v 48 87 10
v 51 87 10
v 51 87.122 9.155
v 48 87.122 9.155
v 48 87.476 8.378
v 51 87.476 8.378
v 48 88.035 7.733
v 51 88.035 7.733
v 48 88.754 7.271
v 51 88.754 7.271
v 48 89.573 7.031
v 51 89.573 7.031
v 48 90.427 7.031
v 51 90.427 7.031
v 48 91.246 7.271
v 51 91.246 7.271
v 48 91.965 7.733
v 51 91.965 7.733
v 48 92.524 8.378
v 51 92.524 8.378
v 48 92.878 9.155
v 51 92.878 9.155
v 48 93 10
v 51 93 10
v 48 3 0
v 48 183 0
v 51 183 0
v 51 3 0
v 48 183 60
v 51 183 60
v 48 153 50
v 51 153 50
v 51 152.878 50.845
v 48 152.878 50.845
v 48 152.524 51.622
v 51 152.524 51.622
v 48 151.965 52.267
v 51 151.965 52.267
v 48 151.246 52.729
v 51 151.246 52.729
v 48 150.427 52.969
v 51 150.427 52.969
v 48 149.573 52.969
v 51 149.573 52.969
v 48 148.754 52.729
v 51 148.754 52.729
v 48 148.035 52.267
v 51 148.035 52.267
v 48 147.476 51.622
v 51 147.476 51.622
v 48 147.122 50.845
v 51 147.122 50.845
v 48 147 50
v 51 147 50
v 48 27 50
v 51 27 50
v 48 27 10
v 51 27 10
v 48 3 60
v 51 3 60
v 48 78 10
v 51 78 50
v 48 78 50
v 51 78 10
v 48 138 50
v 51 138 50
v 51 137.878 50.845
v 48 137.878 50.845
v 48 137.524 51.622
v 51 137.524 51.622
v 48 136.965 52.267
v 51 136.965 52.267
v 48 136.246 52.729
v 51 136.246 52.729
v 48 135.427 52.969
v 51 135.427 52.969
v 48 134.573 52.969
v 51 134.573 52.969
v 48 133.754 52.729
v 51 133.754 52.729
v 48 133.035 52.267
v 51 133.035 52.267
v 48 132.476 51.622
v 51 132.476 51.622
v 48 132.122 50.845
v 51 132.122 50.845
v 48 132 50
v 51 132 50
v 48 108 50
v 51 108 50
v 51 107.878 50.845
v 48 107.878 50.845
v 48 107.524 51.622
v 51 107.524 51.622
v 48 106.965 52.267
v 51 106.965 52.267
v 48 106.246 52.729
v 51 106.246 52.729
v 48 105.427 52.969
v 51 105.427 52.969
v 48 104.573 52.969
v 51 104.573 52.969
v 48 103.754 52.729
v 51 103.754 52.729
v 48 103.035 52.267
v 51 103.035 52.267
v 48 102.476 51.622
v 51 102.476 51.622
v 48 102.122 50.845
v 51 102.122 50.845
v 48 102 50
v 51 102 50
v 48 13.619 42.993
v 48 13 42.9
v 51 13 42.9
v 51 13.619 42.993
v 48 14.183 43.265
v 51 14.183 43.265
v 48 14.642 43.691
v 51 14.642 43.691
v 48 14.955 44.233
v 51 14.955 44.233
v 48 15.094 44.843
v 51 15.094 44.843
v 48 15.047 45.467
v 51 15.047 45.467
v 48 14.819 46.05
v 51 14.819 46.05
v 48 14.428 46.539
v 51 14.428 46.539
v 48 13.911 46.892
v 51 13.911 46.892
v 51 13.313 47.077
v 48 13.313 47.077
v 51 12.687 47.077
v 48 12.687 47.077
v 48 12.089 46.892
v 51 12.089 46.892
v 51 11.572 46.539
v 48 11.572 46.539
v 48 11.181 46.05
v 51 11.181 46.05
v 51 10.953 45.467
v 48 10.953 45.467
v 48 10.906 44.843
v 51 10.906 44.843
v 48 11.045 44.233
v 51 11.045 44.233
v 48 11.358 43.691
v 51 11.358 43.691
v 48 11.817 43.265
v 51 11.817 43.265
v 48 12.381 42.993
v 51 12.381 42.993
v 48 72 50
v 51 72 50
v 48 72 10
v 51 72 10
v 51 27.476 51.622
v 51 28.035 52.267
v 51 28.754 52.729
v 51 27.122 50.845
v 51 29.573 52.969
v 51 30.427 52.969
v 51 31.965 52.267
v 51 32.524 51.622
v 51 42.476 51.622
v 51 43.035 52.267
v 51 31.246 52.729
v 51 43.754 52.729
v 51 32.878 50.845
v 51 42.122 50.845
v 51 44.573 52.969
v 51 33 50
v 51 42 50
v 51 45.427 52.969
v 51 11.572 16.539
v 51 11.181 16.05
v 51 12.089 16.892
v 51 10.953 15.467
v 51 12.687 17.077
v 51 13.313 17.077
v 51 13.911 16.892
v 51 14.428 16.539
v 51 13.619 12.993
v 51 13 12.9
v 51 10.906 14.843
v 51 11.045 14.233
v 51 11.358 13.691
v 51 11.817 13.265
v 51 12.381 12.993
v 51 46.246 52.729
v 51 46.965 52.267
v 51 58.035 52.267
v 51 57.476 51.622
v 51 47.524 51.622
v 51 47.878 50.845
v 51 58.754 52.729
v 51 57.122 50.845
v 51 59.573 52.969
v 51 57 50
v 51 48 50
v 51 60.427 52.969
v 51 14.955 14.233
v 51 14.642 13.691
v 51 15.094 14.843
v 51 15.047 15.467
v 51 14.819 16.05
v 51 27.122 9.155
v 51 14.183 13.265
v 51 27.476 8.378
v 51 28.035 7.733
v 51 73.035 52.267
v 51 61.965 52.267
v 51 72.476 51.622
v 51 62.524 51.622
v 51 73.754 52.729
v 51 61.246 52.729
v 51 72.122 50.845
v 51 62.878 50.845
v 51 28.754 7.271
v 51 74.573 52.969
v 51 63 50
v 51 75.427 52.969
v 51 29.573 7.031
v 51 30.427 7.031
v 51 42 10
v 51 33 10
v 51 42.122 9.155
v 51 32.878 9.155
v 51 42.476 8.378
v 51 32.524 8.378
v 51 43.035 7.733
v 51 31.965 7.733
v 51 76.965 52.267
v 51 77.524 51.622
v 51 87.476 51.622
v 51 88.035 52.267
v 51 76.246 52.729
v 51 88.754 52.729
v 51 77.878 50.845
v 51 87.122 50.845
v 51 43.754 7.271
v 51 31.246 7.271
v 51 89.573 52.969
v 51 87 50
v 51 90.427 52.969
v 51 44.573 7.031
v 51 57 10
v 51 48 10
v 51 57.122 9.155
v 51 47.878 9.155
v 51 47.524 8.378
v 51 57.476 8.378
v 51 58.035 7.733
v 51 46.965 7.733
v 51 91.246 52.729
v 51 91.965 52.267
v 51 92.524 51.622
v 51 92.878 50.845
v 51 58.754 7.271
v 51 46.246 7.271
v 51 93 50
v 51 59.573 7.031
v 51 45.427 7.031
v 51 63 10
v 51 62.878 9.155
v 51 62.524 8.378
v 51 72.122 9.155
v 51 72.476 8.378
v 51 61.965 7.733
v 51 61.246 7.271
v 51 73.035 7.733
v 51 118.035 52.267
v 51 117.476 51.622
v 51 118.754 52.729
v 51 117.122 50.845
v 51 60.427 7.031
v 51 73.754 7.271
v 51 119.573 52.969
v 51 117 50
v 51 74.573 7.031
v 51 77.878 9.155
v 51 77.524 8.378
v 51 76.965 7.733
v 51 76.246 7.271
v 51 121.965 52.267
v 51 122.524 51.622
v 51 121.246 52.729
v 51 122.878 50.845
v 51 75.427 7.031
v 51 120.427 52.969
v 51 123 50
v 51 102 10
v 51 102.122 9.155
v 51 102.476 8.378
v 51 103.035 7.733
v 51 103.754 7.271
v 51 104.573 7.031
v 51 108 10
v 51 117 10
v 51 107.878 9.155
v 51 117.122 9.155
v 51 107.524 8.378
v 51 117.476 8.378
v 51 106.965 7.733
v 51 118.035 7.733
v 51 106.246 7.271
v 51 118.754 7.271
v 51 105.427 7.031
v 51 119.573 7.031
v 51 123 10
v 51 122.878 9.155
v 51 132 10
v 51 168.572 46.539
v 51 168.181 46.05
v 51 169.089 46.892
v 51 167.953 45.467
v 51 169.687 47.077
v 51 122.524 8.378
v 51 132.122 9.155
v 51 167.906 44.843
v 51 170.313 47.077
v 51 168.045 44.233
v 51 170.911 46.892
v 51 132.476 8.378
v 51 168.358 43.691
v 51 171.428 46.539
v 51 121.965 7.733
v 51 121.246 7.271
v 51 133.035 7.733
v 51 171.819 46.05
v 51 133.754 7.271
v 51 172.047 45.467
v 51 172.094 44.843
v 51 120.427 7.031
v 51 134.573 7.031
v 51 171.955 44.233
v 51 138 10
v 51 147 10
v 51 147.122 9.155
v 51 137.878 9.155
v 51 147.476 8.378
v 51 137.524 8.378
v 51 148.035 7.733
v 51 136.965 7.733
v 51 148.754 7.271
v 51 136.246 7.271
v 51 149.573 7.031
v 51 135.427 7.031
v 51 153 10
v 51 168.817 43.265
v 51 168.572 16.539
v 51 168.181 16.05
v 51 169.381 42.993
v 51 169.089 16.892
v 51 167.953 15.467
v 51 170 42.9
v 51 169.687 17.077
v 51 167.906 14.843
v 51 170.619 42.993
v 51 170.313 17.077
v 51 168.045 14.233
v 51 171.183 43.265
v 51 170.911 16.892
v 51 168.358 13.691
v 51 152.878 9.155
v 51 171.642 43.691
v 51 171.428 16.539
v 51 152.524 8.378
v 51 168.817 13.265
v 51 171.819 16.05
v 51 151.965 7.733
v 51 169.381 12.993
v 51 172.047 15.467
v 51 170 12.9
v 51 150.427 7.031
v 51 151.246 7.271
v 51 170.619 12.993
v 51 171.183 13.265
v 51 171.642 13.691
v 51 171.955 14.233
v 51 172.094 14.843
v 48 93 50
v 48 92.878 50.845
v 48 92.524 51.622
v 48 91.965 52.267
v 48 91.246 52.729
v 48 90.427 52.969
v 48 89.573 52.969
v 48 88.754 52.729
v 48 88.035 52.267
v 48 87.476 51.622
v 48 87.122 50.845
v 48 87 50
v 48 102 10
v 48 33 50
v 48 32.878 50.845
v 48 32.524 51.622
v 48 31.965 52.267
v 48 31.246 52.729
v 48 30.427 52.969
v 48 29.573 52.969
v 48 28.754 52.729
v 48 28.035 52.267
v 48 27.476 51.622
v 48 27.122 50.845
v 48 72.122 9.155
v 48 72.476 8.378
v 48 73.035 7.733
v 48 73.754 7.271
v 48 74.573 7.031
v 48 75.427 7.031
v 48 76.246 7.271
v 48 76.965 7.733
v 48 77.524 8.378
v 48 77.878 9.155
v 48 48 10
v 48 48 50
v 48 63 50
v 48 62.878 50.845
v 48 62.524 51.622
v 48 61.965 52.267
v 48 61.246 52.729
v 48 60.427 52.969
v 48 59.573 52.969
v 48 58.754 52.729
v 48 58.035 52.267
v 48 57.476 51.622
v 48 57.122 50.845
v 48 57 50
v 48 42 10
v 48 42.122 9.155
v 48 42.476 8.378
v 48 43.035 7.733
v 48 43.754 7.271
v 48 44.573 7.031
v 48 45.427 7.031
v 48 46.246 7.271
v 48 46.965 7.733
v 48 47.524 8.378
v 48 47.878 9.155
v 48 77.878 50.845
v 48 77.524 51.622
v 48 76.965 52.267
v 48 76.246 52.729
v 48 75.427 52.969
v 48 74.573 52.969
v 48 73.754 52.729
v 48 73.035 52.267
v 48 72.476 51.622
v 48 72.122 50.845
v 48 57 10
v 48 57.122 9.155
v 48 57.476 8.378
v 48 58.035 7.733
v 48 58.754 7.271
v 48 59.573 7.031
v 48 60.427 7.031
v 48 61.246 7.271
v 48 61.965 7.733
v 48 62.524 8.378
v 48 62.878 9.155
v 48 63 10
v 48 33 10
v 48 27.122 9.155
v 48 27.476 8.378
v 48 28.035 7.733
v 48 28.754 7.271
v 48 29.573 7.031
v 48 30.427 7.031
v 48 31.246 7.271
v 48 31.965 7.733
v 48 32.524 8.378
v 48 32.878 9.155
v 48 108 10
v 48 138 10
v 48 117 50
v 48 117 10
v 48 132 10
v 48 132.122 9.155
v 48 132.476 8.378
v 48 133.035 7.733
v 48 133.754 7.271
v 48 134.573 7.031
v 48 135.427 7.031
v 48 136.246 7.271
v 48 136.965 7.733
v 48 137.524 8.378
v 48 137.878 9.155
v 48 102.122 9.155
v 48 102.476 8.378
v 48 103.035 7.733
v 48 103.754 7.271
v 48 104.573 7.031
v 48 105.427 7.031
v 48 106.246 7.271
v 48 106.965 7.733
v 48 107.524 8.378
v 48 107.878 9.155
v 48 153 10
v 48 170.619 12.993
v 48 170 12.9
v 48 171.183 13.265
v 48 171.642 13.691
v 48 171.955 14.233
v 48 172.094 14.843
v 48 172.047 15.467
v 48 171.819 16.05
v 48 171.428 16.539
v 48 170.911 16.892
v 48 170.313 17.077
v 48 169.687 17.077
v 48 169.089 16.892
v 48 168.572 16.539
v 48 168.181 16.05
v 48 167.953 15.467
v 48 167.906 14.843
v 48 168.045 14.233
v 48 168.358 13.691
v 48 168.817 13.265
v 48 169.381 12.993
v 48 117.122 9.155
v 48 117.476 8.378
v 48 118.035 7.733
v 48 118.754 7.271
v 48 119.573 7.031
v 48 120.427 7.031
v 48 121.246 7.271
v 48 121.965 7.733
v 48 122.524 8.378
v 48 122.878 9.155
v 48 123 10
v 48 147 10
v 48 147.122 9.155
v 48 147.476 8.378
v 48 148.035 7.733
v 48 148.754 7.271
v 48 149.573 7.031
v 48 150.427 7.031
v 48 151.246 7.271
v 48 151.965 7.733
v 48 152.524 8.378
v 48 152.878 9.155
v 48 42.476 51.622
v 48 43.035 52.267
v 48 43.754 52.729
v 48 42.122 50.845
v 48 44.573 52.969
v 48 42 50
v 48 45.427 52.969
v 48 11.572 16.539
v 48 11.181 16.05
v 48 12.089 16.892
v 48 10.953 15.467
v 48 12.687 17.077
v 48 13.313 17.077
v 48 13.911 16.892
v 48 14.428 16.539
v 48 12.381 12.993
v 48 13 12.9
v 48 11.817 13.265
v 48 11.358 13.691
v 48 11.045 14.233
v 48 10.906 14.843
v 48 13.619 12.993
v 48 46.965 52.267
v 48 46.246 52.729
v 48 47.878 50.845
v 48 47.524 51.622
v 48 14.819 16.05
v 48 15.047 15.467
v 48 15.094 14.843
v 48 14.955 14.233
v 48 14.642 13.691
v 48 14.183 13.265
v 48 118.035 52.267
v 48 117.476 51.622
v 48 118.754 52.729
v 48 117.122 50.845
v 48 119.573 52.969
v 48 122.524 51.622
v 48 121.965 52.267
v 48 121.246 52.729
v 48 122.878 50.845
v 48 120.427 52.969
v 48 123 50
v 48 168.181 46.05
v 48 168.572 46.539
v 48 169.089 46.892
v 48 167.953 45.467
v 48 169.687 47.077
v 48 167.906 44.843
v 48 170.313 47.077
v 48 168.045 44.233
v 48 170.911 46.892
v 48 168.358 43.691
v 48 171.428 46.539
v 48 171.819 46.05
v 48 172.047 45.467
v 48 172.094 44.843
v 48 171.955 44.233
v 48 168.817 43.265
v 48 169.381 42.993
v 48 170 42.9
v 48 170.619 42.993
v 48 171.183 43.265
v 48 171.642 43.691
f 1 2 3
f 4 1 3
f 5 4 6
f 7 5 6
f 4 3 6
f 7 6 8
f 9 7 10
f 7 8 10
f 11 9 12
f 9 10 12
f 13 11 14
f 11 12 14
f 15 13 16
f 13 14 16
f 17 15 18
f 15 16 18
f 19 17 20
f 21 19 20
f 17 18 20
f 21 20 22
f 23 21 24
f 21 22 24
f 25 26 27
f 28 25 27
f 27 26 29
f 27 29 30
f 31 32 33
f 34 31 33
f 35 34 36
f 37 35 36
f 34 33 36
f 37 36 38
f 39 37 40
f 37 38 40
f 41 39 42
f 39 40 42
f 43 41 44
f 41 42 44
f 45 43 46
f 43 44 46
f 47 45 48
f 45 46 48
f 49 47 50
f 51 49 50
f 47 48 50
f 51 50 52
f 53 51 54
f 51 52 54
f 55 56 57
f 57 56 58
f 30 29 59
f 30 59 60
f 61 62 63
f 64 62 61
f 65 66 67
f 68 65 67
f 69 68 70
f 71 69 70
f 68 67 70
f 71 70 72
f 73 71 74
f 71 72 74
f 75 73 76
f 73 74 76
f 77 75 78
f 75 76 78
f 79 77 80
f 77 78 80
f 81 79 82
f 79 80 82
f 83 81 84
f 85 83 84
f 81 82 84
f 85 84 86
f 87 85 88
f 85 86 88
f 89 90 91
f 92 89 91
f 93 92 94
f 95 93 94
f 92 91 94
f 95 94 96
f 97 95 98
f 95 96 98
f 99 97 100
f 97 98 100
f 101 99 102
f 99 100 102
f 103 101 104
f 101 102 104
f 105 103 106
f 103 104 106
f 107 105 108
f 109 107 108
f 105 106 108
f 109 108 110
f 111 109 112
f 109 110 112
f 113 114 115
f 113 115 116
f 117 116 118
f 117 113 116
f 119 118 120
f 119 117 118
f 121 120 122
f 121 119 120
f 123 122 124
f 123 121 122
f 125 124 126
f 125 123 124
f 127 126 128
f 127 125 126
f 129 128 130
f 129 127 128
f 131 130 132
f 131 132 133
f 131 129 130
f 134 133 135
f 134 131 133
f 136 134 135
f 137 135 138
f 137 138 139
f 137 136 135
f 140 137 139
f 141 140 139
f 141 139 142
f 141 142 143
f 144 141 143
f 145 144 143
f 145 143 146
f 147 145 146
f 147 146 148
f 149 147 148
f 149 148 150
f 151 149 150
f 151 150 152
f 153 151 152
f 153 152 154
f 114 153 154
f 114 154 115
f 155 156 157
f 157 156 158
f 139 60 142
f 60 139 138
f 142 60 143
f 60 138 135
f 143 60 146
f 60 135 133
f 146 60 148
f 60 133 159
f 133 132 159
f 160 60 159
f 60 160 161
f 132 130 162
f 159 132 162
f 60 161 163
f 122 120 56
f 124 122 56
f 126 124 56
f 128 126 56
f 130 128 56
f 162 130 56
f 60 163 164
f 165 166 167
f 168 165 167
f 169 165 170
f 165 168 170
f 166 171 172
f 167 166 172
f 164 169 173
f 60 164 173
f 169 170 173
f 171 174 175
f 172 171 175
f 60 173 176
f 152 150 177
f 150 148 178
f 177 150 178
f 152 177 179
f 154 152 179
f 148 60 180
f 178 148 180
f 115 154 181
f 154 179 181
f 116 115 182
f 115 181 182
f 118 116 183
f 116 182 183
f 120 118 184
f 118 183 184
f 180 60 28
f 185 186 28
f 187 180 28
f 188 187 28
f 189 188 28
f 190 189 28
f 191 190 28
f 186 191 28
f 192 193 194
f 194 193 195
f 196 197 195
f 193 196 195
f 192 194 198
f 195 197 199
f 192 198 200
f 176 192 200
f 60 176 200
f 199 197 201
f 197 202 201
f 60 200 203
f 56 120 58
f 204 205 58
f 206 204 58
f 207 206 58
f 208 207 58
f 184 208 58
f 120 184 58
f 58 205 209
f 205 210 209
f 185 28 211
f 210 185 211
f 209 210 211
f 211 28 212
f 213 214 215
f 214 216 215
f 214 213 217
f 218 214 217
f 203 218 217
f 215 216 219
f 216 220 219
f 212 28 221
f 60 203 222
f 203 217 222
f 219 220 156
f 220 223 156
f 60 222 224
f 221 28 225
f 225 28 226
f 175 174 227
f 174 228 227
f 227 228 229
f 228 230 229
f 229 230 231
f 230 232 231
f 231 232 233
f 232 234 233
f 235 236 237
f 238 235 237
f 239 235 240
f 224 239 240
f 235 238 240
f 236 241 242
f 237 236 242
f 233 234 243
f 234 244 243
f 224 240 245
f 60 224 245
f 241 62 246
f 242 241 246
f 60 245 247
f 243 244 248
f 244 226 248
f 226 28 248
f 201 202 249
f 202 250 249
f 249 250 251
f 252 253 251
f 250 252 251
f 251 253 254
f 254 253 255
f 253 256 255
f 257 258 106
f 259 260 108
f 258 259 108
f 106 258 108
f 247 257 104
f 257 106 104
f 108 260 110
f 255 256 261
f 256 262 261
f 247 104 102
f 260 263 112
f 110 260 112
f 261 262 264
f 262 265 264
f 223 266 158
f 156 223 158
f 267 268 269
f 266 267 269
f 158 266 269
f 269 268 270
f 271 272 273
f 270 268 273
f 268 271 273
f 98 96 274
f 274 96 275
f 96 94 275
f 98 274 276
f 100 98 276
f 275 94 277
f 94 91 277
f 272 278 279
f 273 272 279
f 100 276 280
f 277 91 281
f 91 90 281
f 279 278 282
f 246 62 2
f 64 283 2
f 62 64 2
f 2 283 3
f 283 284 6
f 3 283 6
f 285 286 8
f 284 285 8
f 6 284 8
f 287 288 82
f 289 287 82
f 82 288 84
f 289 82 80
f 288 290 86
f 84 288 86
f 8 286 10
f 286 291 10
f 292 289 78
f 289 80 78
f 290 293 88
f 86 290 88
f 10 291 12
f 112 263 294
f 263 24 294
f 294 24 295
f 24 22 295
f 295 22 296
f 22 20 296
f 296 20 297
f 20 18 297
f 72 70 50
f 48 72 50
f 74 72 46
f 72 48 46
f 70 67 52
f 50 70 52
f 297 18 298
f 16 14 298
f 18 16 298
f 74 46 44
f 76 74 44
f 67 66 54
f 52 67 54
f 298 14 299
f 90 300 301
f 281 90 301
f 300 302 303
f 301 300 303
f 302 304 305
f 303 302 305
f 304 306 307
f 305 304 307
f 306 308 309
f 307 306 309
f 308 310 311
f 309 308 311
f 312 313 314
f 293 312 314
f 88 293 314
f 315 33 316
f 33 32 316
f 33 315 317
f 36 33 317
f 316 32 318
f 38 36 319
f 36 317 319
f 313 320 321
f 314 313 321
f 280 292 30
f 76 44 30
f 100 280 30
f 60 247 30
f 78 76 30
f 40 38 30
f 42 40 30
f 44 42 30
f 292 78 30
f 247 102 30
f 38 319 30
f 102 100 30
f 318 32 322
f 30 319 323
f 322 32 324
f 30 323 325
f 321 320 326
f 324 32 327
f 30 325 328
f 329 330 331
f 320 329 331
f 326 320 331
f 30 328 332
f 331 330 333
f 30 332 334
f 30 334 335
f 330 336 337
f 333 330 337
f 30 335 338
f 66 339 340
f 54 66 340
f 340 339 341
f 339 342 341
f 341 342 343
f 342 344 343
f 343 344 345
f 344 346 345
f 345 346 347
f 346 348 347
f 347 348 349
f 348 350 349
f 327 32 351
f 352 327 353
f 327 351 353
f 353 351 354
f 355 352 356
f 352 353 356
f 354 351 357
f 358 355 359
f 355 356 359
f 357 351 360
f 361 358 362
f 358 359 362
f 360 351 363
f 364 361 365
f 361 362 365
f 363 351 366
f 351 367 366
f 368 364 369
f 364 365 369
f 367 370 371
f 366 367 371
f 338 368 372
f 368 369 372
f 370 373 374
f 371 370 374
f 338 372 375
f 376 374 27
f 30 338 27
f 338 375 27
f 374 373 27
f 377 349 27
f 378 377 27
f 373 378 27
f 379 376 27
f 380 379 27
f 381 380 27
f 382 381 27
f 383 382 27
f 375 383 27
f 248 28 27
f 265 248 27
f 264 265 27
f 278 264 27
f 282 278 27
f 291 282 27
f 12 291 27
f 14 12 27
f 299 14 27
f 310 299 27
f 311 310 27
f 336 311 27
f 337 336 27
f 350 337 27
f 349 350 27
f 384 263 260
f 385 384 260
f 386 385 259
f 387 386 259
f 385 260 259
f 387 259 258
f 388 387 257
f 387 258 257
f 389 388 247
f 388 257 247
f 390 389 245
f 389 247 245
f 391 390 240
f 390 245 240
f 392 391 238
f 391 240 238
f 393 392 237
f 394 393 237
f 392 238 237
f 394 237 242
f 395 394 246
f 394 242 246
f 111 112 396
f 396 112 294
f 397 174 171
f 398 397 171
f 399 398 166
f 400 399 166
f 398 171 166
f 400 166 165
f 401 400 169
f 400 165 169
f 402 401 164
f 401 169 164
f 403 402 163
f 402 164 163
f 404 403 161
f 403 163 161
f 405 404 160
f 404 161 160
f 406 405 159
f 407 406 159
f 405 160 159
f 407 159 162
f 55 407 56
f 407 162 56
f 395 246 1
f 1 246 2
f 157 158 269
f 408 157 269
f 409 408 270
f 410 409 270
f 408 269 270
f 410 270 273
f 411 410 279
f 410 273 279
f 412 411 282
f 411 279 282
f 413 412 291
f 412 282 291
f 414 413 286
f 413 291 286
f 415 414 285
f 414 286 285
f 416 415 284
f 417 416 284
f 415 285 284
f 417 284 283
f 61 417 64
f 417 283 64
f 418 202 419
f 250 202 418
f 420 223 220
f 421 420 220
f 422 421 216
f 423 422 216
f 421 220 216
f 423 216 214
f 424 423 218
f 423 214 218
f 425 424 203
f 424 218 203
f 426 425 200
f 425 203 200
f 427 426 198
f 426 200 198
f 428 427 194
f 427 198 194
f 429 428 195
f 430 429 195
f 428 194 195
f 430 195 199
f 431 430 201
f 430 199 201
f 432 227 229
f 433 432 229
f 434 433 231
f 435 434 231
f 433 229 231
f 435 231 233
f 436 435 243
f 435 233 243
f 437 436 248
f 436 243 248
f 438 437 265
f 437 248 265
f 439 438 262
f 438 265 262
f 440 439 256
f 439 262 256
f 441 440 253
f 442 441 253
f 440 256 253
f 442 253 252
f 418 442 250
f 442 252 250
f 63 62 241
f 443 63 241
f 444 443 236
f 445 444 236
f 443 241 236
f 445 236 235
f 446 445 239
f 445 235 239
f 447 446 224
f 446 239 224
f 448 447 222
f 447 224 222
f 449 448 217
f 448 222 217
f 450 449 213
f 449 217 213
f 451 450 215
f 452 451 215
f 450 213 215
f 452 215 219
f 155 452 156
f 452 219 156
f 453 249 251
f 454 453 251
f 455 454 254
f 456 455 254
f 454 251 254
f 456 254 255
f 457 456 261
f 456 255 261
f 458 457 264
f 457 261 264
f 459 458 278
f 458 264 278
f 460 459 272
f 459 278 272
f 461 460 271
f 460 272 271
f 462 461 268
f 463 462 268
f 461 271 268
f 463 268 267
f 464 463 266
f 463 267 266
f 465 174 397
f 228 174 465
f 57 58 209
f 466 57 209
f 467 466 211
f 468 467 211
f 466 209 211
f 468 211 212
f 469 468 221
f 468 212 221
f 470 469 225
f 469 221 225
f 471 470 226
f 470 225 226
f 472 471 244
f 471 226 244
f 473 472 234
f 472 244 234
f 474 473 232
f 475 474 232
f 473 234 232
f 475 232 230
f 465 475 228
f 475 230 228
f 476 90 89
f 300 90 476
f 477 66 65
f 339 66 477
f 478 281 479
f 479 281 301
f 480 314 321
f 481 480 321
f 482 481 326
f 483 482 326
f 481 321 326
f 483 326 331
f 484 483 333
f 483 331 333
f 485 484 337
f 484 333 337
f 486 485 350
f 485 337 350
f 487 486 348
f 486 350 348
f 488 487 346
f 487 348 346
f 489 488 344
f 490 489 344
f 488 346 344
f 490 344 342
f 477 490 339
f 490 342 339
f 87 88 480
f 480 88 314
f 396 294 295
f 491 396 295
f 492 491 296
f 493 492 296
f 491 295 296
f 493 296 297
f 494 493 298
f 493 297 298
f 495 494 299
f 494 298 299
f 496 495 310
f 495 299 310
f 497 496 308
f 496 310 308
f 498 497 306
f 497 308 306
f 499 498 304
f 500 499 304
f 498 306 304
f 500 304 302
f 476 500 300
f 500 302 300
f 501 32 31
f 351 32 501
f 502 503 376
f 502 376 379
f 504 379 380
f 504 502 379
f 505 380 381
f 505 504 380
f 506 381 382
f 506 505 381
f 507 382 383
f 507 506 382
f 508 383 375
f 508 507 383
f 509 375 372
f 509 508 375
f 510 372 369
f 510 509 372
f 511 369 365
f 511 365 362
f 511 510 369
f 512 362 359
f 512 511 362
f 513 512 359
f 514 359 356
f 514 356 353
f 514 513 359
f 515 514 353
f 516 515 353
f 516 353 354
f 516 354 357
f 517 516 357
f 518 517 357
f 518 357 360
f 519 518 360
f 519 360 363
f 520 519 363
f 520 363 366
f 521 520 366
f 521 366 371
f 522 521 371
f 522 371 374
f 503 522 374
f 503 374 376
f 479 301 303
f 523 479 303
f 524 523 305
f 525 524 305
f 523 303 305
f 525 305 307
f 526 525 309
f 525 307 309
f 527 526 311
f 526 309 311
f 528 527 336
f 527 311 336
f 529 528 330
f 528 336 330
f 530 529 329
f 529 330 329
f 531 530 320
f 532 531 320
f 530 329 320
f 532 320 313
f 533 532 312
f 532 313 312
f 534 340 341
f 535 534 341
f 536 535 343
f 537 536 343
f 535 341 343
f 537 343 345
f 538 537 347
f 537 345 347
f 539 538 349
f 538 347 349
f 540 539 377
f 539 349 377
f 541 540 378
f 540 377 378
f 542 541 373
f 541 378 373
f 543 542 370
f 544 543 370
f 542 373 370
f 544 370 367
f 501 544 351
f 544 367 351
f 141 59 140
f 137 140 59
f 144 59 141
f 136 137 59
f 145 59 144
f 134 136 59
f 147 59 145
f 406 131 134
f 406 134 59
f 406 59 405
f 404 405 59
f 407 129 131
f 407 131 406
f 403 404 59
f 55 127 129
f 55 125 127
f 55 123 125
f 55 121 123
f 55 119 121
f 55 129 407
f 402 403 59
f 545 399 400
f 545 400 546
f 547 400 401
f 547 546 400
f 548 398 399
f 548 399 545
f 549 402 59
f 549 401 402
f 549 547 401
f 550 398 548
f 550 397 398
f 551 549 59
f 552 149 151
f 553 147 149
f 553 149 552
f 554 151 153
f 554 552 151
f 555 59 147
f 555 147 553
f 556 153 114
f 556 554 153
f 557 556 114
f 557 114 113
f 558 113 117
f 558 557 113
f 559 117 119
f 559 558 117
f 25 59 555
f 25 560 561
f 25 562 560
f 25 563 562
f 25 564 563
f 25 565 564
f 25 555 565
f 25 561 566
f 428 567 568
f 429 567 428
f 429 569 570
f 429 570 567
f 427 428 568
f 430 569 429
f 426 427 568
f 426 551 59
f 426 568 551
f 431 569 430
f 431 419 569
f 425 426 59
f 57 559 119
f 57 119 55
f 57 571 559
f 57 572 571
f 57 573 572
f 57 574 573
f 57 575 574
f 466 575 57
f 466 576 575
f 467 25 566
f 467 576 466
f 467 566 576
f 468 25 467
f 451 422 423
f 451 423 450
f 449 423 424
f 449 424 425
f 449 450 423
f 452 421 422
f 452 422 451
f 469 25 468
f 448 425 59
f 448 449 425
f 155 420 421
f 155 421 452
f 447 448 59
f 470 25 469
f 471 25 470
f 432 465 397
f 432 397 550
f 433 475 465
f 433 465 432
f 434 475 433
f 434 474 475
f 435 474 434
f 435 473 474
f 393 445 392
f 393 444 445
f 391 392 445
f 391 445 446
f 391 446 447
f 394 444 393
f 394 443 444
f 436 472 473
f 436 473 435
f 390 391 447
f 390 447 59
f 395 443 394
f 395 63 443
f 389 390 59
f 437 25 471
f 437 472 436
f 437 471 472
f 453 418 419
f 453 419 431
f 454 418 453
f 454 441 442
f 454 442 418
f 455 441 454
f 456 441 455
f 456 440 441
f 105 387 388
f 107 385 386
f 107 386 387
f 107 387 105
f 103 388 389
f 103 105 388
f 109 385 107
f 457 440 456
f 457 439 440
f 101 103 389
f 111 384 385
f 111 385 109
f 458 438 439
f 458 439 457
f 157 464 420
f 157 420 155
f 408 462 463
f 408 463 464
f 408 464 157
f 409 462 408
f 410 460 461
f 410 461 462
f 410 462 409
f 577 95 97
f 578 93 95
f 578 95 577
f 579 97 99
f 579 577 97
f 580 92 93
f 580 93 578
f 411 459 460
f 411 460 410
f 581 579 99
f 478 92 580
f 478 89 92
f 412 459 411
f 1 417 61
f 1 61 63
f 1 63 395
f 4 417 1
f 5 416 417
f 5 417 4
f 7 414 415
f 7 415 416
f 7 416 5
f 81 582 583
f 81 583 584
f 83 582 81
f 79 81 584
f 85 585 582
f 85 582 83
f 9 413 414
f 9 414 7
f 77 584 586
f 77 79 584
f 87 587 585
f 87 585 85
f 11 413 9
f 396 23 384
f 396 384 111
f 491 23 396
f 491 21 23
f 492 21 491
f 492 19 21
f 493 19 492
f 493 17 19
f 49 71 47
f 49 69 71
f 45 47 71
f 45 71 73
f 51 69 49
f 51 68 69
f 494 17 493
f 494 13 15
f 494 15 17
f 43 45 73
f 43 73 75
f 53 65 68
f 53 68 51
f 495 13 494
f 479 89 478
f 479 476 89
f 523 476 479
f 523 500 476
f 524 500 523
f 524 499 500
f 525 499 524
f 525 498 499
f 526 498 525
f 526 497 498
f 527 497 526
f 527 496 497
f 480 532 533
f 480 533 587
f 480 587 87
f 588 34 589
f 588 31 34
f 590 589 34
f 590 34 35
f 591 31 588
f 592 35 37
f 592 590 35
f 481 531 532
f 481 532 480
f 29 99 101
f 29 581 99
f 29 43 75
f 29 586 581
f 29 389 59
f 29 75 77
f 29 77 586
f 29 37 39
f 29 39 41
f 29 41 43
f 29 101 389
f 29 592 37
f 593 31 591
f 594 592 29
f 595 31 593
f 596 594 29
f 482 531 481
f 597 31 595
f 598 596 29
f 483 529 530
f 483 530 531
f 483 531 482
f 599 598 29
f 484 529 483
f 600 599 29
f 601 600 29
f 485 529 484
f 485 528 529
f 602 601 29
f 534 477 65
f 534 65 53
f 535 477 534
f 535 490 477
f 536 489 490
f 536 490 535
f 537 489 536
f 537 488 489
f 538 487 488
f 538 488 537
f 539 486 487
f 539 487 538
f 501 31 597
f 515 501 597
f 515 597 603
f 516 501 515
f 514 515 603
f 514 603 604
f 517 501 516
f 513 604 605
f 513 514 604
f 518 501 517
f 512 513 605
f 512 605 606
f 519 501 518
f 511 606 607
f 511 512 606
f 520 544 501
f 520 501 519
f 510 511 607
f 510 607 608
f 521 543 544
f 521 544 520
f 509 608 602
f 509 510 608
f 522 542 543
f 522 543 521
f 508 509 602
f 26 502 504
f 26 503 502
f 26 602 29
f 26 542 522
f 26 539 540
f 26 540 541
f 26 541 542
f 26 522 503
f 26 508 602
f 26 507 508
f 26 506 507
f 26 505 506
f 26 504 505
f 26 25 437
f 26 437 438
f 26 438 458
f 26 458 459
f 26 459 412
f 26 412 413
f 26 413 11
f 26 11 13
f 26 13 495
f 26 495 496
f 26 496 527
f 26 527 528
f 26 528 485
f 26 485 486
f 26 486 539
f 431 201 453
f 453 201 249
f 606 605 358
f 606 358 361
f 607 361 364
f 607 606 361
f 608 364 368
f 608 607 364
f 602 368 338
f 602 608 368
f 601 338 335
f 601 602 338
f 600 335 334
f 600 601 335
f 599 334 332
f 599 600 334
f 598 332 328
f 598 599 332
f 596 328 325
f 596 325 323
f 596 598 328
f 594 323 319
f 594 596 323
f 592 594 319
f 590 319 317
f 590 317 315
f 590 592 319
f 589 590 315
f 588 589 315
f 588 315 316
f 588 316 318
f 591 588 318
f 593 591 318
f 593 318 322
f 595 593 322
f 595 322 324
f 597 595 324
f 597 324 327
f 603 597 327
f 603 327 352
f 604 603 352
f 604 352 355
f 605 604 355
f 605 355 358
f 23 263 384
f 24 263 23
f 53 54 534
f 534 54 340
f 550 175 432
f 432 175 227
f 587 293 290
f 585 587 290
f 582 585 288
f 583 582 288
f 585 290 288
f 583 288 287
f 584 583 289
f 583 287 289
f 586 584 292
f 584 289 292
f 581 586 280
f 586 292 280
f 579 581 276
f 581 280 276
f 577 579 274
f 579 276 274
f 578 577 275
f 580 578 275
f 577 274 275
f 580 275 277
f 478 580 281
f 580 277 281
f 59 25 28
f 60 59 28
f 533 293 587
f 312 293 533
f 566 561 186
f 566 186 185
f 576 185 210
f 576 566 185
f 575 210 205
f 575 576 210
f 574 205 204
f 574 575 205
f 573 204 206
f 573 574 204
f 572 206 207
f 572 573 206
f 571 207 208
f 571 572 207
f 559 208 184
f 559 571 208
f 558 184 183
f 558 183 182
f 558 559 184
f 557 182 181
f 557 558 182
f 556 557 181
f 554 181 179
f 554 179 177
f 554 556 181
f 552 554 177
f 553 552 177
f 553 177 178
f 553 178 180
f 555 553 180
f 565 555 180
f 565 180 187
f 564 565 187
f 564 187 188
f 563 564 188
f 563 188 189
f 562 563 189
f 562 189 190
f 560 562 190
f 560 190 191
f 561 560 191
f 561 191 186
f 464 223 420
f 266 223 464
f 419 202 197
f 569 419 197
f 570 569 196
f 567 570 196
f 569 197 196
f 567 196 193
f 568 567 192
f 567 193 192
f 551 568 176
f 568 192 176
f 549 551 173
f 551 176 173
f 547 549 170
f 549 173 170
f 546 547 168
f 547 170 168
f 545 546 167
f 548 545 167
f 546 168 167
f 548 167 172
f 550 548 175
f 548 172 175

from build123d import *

# Parameters (mm, degrees)
EXTRUDE001_DEPTH  = 51
ARRAY002_Y_COUNT  = 9
ARRAY002_Y_PITCH  = 15
CYLINDER003_R     = 2.1
CYLINDER003_DEPTH = 102
ARRAY001_Y_COUNT  = 2
ARRAY001_Y_PITCH  = 157
ARRAY001_Z_COUNT  = 2
ARRAY001_Z_PITCH  = 30
BOX004_W          = 3
BOX004_H          = 180
BOX004_DEPTH      = 60


with BuildPart() as side_vent_array:
    # Sketch001 → Extrude001 (new body, symmetric)
    with BuildSketch(Plane.YZ):
        with BuildLine():
            Line((-3, 50), (-3, 10))
            ThreePointArc((-3, 10), (0, 7), (3, 10))
            Line((3, 50), (3, 10))
            ThreePointArc((3, 50), (0, 53), (-3, 50))
        make_face()
    extrude(amount=EXTRUDE001_DEPTH, both=True)

    # Array002 Y: side vent array ×9


with BuildPart() as side_vent_array_1:
    add(side_vent_array.part)
    with Locations(*[(0, i * ARRAY002_Y_PITCH, 0) for i in range(1, ARRAY002_Y_COUNT)]):
        add(side_vent_array.part)


with BuildPart() as side_vent_array_2:
    # Array002 placement: moved
    add(side_vent_array_1.part.moved(Location((0, 30, 0))))


with BuildPart() as side_hole_fusion:
    # Cylinder003 → Cylinder003 (new body)
    with BuildSketch(Plane(origin=(-51, 13, 15), x_dir=(0, 0, -1), z_dir=(1, 0, 0))):
        Circle(CYLINDER003_R)
    extrude(amount=CYLINDER003_DEPTH)

    # Array001 Y: side hole fusion ×2


with BuildPart() as side_hole_fusion_1:
    add(side_hole_fusion.part)
    with Locations(*[(0, i * ARRAY001_Y_PITCH, 0) for i in range(1, ARRAY001_Y_COUNT)]):
        add(side_hole_fusion.part)

    # Array001 Z: side hole fusion ×2


with BuildPart() as side_hole_fusion_2:
    add(side_hole_fusion_1.part)
    with Locations(*[(0, 0, i * ARRAY001_Z_PITCH) for i in range(1, ARRAY001_Z_COUNT)]):
        add(side_hole_fusion_1.part)

    # Fusion001: union side vent array
    add(side_vent_array_2.part)


with BuildPart() as psu_side_cut001:
    # Box004 → Box004 (new body)
    with BuildSketch(Plane(origin=(48, 3, 0), x_dir=(1, 0, 0), z_dir=(0, 0, 1))):
        with Locations((1.5, 90)):
            Rectangle(BOX004_W, BOX004_H)
    extrude(amount=BOX004_DEPTH)

    # Cut001: cut side hole fusion
    add(side_hole_fusion_2.part, mode=Mode.SUBTRACT)


solid = psu_side_cut001.part
